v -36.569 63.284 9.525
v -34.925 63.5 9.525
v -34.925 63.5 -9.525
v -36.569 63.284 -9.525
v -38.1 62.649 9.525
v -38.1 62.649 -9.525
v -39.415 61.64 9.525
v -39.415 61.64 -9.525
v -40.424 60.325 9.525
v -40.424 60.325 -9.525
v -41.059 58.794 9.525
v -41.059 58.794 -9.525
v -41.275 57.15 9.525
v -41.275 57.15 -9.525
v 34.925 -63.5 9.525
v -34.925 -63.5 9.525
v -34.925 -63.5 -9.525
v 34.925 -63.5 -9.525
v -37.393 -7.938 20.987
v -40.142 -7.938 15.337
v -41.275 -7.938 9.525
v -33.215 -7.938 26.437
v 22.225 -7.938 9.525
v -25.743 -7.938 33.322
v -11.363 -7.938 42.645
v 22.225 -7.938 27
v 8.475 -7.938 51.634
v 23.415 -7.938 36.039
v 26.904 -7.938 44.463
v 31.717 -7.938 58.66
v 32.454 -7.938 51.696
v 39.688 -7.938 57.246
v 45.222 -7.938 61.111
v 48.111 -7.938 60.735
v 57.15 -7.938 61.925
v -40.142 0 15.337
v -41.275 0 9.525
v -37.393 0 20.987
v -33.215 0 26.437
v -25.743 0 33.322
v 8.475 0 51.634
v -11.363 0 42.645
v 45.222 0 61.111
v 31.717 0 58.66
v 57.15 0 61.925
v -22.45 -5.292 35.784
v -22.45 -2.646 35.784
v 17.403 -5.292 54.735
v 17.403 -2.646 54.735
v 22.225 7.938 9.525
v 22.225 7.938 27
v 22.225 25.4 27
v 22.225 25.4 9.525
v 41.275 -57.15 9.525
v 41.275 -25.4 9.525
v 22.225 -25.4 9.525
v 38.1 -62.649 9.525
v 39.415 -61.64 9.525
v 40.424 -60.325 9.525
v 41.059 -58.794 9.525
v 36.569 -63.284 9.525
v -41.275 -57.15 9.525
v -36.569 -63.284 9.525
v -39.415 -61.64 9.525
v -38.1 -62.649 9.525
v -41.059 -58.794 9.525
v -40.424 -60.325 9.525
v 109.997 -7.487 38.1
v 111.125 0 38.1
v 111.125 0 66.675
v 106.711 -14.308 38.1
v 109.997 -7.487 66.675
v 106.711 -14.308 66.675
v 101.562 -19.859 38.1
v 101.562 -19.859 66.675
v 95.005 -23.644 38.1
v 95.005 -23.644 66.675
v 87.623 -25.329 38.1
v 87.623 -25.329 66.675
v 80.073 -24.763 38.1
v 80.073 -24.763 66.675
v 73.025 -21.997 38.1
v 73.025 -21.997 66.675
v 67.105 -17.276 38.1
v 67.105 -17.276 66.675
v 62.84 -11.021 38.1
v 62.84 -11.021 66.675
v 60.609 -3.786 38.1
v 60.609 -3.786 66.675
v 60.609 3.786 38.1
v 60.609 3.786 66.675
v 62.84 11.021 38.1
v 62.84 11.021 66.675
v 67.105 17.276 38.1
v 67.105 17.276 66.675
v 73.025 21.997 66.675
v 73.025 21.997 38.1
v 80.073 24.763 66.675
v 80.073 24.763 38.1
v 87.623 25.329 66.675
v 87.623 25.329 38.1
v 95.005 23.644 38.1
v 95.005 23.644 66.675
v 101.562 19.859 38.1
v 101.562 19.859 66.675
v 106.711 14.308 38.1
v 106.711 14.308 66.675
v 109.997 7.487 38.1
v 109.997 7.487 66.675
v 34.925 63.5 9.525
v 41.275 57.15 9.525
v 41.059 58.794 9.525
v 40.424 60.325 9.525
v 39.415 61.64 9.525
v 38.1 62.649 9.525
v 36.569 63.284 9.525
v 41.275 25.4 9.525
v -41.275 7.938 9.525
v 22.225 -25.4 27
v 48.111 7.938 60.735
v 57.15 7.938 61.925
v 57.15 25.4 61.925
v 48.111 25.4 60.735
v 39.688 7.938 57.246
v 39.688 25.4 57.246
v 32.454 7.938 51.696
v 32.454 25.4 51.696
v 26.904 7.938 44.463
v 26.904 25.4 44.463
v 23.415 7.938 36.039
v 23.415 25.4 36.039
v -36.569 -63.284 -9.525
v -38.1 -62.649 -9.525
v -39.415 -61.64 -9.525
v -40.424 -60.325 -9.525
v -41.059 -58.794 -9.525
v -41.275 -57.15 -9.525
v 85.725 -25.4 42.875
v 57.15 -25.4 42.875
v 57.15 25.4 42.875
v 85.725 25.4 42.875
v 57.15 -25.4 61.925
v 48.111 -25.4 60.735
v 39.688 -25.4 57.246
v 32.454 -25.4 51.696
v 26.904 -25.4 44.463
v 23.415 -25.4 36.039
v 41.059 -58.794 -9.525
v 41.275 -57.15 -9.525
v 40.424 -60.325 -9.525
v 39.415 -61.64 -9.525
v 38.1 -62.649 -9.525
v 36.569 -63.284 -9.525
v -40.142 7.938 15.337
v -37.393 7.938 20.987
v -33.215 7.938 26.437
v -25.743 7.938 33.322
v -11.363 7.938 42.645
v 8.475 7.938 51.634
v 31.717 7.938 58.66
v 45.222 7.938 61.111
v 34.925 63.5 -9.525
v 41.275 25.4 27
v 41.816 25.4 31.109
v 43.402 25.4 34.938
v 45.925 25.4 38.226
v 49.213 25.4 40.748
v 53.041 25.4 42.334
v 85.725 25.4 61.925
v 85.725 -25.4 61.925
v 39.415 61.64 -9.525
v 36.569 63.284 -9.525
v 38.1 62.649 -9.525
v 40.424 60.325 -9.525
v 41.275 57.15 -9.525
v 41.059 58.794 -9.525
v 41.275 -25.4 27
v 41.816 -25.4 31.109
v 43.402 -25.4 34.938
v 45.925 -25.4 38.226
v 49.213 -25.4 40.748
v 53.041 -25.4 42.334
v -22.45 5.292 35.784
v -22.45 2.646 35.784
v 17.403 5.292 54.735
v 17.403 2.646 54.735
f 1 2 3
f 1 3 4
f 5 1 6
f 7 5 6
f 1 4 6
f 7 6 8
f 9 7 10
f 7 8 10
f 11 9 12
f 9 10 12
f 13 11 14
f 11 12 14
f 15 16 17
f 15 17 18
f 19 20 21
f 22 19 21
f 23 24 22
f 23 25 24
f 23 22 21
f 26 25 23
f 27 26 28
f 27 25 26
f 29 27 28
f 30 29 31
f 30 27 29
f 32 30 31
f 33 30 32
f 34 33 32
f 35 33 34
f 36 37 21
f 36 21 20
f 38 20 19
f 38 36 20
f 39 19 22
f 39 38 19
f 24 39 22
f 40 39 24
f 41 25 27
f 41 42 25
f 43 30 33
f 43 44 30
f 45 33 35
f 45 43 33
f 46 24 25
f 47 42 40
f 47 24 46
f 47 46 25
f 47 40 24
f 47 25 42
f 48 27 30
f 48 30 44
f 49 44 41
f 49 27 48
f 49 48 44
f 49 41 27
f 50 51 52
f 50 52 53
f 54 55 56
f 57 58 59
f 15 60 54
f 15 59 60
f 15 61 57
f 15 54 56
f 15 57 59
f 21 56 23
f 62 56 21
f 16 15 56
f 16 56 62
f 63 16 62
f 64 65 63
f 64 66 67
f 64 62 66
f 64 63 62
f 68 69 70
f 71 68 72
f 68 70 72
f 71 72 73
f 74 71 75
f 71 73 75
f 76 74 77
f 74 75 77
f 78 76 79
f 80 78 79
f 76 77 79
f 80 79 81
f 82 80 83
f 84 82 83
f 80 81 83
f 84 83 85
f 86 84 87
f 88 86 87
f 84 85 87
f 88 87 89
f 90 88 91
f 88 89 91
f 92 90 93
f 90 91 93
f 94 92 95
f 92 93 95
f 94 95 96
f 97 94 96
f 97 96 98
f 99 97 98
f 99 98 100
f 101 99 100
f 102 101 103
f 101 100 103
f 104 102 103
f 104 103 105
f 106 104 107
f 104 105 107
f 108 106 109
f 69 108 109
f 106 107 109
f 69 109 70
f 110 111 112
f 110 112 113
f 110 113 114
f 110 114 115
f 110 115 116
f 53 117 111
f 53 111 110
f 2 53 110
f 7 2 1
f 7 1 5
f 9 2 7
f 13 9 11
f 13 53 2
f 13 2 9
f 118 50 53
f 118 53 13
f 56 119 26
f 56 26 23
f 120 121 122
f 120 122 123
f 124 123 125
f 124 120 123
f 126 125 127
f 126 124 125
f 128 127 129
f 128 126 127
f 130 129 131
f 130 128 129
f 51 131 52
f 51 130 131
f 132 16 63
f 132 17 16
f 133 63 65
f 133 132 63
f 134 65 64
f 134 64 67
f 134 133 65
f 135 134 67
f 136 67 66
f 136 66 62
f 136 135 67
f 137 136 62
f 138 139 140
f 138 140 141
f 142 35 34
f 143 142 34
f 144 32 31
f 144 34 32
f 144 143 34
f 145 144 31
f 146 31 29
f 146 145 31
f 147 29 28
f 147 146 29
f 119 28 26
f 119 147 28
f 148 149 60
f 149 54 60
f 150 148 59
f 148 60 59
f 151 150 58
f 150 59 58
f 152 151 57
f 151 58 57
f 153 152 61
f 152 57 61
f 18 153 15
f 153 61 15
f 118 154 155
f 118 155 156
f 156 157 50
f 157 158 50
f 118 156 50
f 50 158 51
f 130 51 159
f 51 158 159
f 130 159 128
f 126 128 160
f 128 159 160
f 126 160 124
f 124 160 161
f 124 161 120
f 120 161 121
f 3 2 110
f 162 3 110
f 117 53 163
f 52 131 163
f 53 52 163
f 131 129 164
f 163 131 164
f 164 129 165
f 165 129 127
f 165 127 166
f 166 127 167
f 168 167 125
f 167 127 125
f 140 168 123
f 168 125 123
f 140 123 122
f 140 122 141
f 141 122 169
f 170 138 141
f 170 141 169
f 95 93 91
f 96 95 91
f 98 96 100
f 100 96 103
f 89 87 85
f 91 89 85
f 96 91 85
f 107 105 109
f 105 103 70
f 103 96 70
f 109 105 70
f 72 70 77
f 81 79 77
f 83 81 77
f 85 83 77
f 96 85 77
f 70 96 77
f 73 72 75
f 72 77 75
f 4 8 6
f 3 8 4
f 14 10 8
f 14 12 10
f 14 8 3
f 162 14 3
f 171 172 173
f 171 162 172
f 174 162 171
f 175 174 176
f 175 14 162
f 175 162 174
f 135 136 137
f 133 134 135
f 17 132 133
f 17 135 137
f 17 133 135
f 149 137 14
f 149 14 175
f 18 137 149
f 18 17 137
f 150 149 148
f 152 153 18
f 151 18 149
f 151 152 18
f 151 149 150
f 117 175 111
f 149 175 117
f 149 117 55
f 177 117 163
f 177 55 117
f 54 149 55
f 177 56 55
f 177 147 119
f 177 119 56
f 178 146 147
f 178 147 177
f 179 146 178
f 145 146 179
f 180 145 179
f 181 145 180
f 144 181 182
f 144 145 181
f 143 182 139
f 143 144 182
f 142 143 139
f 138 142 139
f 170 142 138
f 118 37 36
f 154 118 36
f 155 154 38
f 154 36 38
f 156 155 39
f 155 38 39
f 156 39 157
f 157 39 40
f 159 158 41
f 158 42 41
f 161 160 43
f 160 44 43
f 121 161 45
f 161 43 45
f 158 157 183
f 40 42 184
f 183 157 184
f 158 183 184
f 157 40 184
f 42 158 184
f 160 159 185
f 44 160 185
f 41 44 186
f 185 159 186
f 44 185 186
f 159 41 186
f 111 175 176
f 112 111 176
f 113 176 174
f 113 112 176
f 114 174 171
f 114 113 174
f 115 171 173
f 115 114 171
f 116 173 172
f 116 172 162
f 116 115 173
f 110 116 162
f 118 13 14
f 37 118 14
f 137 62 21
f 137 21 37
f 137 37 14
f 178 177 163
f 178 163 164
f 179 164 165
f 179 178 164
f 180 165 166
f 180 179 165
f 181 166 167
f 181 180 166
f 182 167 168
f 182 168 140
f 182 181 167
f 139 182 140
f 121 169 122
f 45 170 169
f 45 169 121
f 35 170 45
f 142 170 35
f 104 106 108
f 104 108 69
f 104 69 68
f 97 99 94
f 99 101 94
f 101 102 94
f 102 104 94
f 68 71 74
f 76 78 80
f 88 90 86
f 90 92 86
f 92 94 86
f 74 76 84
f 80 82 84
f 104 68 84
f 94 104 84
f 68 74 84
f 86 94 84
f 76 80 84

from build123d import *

# Parameters (mm, degrees)
F1_DEPTH = 63.5
F0_W     = 25.4
F0_H     = 19.05
F2_DEPTH = 25.4
F3_DEPTH = 7.9375
F5_R     = 6.35


with BuildPart() as f1:
    # F0 (on Front) → F1 (new body, symmetric)
    with BuildSketch(Plane.XZ):
        Polygon((41.275, -9.525), (41.275, 9.525), (22.225, 9.525), (-41.275, 9.525), (-41.275, -9.525), align=None)
    extrude(amount=F1_DEPTH, both=True)

    # F0 (on Front) → F2 (join, symmetric)
    with BuildSketch(Plane.XZ):
        with BuildLine():
            Line((22.225, 9.525), (41.275, 9.525))
            Line((41.275, 9.525), (41.275, 27.0002))
            ThreePointArc((41.275, 27.0002), (45.92468, 38.22552), (57.15, 42.8752))
            Line((57.15, 42.8752), (60.325, 42.8752))
            Line((60.325, 42.8752), (60.325, 61.9252))
            Line((60.325, 61.9252), (57.15, 61.9252))
            ThreePointArc((57.15, 61.9252), (32.454296, 51.695904), (22.225, 27.0002))
            Line((22.225, 27.0002), (22.225, 9.525))
        make_face()
        with Locations((73.025, 52.4002)):
            Rectangle(F0_W, F0_H)
    extrude(amount=F2_DEPTH, both=True)

    # F0 (on Front) → F3 (join, symmetric)
    with BuildSketch(Plane.XZ):
        with BuildLine():
            Line((-41.275, 9.525), (22.225, 9.525))
            Line((22.225, 9.525), (22.225, 27.0002))
            ThreePointArc((22.225, 27.0002), (32.454296, 51.695904), (57.15, 61.9252))
            add(Edge.make_bspline(
                [(-41.275, 9.525), (-40.00771, 37.953217), (24.499903, 62.09942), (57.15, 61.9252)],
                knots=[0, 0, 0, 0, 111.504536, 111.504536, 111.504536, 111.504536], degree=3))
        make_face()
    extrude(amount=F3_DEPTH, both=True)

    # F5
    f5_edges = [f1.edges().sort_by_distance(p)[0] for p in [
        (41.275, -63.5, 0),
        (-41.275, -63.5, 0),
        (41.275, 63.5, 0),
        (-41.275, 63.5, 0),
    ]]
    fillet(f5_edges, radius=F5_R)


with BuildPart() as f4:
    # F0 (on Front) → F4 (revolve)
    with BuildSketch(Plane.XZ):
        Polygon((85.725, 61.9252), (85.725, 42.8752), (85.725, 38.1), (111.125, 38.1), (111.125, 66.675), (85.725, 66.675), align=None)
    revolve(axis=Axis((85.725, 0, 52.3875), (0, 0, -1)))


solid = Compound([f1.part, f4.part])
